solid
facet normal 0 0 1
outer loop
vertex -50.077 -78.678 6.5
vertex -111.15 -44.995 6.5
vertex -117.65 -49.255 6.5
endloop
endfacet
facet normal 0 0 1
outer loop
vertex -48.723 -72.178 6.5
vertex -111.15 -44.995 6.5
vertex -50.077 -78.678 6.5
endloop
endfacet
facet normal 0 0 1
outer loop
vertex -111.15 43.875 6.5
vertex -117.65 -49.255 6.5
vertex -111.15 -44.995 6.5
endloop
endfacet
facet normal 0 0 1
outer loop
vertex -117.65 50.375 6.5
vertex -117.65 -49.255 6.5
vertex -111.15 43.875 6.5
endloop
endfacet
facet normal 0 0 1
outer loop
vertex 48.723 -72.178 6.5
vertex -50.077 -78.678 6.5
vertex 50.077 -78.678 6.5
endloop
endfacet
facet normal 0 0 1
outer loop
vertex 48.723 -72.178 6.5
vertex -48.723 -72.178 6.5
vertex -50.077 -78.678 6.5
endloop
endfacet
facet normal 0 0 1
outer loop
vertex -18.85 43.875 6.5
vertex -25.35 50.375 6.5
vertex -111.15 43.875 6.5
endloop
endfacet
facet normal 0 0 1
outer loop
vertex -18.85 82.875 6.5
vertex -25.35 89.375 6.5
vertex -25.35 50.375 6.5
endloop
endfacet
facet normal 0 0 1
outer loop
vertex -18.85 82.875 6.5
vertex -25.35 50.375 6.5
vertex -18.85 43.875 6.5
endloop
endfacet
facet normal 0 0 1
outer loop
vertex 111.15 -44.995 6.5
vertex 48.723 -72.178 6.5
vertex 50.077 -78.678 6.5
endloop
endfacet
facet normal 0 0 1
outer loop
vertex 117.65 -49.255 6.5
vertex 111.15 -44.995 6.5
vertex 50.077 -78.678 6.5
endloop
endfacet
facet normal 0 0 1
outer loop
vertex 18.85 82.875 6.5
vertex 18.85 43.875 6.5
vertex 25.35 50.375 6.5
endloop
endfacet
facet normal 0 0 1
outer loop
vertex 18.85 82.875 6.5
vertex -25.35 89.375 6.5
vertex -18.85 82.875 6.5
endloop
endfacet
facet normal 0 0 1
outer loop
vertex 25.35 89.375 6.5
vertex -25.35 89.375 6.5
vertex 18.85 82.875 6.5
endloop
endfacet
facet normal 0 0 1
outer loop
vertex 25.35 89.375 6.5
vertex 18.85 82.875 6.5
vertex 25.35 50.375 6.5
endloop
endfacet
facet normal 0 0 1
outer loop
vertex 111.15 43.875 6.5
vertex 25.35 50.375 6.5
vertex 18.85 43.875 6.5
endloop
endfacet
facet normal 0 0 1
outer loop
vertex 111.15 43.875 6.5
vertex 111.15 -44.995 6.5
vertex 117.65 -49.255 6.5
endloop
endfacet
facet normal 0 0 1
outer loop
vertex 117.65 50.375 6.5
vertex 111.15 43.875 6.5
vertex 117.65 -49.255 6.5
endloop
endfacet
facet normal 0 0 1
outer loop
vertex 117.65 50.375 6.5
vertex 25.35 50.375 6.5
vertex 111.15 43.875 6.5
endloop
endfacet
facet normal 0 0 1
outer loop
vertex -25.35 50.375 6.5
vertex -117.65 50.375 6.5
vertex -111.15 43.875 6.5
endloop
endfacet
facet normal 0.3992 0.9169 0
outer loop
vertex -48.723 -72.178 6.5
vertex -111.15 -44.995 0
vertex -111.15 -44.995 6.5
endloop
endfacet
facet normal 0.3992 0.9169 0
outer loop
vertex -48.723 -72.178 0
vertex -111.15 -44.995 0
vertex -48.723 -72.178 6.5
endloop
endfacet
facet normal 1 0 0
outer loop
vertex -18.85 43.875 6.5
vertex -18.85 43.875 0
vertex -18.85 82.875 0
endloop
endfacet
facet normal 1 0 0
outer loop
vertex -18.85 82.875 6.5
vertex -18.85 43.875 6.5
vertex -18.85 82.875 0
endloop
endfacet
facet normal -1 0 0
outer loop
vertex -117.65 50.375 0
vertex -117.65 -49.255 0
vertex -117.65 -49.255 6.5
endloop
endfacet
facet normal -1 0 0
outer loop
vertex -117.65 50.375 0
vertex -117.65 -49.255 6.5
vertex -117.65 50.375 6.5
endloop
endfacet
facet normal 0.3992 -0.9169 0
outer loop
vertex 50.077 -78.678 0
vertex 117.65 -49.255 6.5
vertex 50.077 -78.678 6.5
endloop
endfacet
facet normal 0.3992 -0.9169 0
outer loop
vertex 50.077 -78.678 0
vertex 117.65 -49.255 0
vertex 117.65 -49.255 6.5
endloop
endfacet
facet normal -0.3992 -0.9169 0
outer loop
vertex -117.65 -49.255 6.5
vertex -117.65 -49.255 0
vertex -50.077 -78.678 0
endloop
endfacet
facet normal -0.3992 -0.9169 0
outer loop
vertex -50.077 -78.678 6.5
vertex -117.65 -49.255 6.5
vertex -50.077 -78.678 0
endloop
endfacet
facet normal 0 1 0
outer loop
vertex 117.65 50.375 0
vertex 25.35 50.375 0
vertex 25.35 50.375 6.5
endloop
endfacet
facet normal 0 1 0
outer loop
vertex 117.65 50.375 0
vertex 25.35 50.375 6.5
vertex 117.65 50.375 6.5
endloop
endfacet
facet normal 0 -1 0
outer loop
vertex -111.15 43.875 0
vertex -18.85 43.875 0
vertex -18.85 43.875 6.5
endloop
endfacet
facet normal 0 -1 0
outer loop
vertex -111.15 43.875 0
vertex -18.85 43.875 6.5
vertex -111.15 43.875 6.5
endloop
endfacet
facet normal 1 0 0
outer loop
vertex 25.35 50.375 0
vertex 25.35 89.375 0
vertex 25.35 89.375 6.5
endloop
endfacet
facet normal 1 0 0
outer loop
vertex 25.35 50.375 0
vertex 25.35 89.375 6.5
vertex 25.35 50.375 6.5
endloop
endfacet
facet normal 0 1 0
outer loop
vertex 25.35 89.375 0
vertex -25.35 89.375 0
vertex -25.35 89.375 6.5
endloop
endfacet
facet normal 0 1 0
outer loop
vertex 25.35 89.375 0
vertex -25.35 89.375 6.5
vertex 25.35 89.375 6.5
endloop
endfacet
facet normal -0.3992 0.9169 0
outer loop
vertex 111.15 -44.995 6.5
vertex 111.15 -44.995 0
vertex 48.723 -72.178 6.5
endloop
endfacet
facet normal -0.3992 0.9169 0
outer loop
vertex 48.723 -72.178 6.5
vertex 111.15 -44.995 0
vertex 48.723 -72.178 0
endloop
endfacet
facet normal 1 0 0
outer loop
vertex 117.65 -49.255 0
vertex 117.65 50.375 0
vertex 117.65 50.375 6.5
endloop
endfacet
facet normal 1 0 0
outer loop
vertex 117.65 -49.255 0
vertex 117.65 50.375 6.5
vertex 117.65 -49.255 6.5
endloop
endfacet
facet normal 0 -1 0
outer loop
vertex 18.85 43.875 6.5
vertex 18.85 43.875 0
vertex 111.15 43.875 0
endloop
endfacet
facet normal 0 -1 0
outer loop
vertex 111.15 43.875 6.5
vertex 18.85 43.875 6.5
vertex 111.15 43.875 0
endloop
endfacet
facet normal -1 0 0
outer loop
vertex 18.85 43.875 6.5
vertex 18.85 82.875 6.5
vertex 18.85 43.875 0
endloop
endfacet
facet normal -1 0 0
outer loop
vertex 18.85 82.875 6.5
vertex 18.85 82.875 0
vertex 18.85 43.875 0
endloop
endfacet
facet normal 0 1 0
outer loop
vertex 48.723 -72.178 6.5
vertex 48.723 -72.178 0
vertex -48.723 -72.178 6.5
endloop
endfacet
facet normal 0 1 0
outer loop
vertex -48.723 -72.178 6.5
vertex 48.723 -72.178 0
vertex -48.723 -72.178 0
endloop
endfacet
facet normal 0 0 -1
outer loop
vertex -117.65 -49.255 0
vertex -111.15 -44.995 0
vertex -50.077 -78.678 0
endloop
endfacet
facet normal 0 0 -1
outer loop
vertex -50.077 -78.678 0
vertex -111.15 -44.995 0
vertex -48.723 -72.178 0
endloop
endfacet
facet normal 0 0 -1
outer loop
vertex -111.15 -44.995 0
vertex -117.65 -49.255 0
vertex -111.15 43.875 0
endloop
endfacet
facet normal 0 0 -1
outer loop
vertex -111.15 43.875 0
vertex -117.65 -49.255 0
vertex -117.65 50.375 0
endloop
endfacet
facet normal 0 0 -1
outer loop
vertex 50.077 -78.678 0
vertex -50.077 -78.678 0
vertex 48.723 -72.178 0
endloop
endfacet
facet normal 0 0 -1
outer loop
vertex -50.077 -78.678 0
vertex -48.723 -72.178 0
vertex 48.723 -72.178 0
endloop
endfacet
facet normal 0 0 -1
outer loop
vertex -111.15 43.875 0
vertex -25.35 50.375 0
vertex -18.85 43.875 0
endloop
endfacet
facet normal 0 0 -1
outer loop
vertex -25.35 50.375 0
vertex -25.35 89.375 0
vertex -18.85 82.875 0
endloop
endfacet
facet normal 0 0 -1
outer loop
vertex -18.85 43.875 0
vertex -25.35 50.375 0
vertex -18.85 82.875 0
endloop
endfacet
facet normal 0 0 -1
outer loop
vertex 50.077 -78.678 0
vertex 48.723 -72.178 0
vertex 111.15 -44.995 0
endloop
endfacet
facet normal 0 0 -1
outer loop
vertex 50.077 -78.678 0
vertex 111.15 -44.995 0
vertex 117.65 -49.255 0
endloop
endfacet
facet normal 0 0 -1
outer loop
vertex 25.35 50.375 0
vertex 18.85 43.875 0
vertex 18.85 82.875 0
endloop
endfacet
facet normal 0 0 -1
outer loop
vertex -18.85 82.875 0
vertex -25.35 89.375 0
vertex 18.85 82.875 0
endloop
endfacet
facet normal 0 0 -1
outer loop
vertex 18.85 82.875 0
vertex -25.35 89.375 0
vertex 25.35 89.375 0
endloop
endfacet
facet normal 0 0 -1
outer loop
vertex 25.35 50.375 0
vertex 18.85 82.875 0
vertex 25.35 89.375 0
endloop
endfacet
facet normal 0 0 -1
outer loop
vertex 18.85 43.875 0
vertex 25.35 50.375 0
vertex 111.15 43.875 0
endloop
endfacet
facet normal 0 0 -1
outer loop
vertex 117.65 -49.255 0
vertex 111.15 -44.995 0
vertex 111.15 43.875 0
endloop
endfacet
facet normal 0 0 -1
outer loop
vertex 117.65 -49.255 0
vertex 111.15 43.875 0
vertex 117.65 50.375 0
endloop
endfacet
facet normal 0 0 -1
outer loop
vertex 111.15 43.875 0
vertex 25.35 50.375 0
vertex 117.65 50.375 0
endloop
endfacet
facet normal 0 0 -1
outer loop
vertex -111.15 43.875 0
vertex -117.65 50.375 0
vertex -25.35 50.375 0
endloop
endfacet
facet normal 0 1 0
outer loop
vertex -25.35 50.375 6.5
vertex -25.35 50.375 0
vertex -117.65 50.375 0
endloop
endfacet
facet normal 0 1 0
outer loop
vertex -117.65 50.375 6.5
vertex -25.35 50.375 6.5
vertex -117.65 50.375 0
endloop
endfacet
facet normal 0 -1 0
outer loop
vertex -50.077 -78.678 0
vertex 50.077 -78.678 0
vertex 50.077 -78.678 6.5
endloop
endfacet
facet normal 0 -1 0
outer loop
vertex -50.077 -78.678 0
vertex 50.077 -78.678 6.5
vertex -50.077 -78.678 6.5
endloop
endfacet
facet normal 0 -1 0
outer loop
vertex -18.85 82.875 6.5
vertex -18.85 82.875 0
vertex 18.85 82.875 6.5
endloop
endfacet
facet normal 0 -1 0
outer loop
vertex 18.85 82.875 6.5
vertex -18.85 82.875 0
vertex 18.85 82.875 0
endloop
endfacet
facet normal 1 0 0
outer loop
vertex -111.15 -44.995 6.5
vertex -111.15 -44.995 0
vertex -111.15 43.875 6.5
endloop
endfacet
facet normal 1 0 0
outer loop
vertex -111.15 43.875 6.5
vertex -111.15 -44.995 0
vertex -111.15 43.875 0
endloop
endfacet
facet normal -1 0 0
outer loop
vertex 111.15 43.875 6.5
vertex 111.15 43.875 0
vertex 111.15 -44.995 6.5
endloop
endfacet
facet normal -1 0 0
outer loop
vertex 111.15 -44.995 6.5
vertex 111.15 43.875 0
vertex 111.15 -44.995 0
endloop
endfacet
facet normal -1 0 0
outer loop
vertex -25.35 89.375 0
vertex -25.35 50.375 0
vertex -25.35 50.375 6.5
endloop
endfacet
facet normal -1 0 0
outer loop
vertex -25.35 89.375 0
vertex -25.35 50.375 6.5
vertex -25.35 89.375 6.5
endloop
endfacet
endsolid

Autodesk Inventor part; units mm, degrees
ref_plane "YZ Plane" through (0, 0, 0) normal (1, 0, 0) x (0, 1, 0)
ref_plane "XZ Plane" through (0, 0, 0) normal (0, 1, 0) x (-1, 0, 0)
ref_plane "XY Plane" through (0, 0, 0) normal (0, 0, 1) x (1, 0, 0)
sketch "Sketch1" plane through (0, 0, 0) normal (0, 0, 1) x (1, 0, 0)
  line L0 (107.9, 41.925) -> (107.9, -41.925)
  line L1 (-107.9, -41.925) -> (-107.9, 41.925)
  line L2 (-107.9, 41.925) -> (107.9, -41.925) construction
  line L3 (107.9, 41.925) -> (-107.9, -41.925) construction
  line L4 (-15.6, 80.925) -> (15.6, 80.925)
  line L5 (-15.6, 41.925) -> (-107.9, 41.925)
  line L6 (15.6, 41.925) -> (107.9, 41.925)
  line L7 (-107.9, -41.925) -> (-49.4, -67.398)
  line L8 (107.9, -41.925) -> (49.4, -67.398)
  line L9 (49.4, -67.398) -> (-49.4, -67.398)
  line L10 (-114.4, -47.125) -> (-114.4, 47.125)
  line L11 (114.4, 47.125) -> (114.4, -47.125)
  line L12 (114.4, -47.125) -> (-114.4, 47.125) construction
  line L13 (-114.4, -47.125) -> (114.4, 47.125) construction
  line L14 (-22.1, 47.125) -> (-22.1, 86.125)
  line L15 (-22.1, 86.125) -> (22.1, 86.125)
  line L16 (22.1, 86.125) -> (22.1, 47.125)
  line L17 (22.1, 47.125) -> (114.4, 47.125)
  line L18 (-22.1, 47.125) -> (-114.4, 47.125)
  line L19 (114.4, -47.125) -> (49.4, -75.4283)
  line L20 (-114.4, -47.125) -> (-49.4, -75.4283)
  line L21 (49.4, -75.4283) -> (-49.4, -75.4283)
  line L22 (-15.6, 41.925) -> (-15.6, 80.925)
  line L23 (15.6, 41.925) -> (15.6, 80.925)
  point P0 (0, 0)
  point P1 (0, 0)
  point P2 (0, 80.925)
  point P3 (0, 0)
  point P4 (0, 86.125)
  point P5 (0, 0)
  dimension "Comp" = 215.8
  dimension "Lar" = 83.85
  dimension "Larg1" = 31.2
  dimension "d10" = 215.8
  dimension "d15" = 58.5
  dimension "d16" = 98.8
  dimension "d17" = 58.5
  dimension "LarMaior" = 94.25
  dimension "CompMaior" = 228.8
  dimension "d20" = 39
  dimension "d21" = 44.2
  dimension "d22" = 39
  dimension "d25" = 65
  dimension "d27" = 65
  dimension "d28" = 98.8
extrude "Extrusion1" add sketch "Sketch1" along normal blind 6.5 contours L0 L8 L9 L7 L1 L5 L22 L4 L23 L6 | L10 L18 L14 L15 L16 L17 L11 L19 L21 L20
shell "Shell1" thickness 6.5 both sides yes removed faces 2 at (-7.3667, -34.5772, 6.5) at (-7.3667, -34.5772, 0)
properties part number "Buste1"
